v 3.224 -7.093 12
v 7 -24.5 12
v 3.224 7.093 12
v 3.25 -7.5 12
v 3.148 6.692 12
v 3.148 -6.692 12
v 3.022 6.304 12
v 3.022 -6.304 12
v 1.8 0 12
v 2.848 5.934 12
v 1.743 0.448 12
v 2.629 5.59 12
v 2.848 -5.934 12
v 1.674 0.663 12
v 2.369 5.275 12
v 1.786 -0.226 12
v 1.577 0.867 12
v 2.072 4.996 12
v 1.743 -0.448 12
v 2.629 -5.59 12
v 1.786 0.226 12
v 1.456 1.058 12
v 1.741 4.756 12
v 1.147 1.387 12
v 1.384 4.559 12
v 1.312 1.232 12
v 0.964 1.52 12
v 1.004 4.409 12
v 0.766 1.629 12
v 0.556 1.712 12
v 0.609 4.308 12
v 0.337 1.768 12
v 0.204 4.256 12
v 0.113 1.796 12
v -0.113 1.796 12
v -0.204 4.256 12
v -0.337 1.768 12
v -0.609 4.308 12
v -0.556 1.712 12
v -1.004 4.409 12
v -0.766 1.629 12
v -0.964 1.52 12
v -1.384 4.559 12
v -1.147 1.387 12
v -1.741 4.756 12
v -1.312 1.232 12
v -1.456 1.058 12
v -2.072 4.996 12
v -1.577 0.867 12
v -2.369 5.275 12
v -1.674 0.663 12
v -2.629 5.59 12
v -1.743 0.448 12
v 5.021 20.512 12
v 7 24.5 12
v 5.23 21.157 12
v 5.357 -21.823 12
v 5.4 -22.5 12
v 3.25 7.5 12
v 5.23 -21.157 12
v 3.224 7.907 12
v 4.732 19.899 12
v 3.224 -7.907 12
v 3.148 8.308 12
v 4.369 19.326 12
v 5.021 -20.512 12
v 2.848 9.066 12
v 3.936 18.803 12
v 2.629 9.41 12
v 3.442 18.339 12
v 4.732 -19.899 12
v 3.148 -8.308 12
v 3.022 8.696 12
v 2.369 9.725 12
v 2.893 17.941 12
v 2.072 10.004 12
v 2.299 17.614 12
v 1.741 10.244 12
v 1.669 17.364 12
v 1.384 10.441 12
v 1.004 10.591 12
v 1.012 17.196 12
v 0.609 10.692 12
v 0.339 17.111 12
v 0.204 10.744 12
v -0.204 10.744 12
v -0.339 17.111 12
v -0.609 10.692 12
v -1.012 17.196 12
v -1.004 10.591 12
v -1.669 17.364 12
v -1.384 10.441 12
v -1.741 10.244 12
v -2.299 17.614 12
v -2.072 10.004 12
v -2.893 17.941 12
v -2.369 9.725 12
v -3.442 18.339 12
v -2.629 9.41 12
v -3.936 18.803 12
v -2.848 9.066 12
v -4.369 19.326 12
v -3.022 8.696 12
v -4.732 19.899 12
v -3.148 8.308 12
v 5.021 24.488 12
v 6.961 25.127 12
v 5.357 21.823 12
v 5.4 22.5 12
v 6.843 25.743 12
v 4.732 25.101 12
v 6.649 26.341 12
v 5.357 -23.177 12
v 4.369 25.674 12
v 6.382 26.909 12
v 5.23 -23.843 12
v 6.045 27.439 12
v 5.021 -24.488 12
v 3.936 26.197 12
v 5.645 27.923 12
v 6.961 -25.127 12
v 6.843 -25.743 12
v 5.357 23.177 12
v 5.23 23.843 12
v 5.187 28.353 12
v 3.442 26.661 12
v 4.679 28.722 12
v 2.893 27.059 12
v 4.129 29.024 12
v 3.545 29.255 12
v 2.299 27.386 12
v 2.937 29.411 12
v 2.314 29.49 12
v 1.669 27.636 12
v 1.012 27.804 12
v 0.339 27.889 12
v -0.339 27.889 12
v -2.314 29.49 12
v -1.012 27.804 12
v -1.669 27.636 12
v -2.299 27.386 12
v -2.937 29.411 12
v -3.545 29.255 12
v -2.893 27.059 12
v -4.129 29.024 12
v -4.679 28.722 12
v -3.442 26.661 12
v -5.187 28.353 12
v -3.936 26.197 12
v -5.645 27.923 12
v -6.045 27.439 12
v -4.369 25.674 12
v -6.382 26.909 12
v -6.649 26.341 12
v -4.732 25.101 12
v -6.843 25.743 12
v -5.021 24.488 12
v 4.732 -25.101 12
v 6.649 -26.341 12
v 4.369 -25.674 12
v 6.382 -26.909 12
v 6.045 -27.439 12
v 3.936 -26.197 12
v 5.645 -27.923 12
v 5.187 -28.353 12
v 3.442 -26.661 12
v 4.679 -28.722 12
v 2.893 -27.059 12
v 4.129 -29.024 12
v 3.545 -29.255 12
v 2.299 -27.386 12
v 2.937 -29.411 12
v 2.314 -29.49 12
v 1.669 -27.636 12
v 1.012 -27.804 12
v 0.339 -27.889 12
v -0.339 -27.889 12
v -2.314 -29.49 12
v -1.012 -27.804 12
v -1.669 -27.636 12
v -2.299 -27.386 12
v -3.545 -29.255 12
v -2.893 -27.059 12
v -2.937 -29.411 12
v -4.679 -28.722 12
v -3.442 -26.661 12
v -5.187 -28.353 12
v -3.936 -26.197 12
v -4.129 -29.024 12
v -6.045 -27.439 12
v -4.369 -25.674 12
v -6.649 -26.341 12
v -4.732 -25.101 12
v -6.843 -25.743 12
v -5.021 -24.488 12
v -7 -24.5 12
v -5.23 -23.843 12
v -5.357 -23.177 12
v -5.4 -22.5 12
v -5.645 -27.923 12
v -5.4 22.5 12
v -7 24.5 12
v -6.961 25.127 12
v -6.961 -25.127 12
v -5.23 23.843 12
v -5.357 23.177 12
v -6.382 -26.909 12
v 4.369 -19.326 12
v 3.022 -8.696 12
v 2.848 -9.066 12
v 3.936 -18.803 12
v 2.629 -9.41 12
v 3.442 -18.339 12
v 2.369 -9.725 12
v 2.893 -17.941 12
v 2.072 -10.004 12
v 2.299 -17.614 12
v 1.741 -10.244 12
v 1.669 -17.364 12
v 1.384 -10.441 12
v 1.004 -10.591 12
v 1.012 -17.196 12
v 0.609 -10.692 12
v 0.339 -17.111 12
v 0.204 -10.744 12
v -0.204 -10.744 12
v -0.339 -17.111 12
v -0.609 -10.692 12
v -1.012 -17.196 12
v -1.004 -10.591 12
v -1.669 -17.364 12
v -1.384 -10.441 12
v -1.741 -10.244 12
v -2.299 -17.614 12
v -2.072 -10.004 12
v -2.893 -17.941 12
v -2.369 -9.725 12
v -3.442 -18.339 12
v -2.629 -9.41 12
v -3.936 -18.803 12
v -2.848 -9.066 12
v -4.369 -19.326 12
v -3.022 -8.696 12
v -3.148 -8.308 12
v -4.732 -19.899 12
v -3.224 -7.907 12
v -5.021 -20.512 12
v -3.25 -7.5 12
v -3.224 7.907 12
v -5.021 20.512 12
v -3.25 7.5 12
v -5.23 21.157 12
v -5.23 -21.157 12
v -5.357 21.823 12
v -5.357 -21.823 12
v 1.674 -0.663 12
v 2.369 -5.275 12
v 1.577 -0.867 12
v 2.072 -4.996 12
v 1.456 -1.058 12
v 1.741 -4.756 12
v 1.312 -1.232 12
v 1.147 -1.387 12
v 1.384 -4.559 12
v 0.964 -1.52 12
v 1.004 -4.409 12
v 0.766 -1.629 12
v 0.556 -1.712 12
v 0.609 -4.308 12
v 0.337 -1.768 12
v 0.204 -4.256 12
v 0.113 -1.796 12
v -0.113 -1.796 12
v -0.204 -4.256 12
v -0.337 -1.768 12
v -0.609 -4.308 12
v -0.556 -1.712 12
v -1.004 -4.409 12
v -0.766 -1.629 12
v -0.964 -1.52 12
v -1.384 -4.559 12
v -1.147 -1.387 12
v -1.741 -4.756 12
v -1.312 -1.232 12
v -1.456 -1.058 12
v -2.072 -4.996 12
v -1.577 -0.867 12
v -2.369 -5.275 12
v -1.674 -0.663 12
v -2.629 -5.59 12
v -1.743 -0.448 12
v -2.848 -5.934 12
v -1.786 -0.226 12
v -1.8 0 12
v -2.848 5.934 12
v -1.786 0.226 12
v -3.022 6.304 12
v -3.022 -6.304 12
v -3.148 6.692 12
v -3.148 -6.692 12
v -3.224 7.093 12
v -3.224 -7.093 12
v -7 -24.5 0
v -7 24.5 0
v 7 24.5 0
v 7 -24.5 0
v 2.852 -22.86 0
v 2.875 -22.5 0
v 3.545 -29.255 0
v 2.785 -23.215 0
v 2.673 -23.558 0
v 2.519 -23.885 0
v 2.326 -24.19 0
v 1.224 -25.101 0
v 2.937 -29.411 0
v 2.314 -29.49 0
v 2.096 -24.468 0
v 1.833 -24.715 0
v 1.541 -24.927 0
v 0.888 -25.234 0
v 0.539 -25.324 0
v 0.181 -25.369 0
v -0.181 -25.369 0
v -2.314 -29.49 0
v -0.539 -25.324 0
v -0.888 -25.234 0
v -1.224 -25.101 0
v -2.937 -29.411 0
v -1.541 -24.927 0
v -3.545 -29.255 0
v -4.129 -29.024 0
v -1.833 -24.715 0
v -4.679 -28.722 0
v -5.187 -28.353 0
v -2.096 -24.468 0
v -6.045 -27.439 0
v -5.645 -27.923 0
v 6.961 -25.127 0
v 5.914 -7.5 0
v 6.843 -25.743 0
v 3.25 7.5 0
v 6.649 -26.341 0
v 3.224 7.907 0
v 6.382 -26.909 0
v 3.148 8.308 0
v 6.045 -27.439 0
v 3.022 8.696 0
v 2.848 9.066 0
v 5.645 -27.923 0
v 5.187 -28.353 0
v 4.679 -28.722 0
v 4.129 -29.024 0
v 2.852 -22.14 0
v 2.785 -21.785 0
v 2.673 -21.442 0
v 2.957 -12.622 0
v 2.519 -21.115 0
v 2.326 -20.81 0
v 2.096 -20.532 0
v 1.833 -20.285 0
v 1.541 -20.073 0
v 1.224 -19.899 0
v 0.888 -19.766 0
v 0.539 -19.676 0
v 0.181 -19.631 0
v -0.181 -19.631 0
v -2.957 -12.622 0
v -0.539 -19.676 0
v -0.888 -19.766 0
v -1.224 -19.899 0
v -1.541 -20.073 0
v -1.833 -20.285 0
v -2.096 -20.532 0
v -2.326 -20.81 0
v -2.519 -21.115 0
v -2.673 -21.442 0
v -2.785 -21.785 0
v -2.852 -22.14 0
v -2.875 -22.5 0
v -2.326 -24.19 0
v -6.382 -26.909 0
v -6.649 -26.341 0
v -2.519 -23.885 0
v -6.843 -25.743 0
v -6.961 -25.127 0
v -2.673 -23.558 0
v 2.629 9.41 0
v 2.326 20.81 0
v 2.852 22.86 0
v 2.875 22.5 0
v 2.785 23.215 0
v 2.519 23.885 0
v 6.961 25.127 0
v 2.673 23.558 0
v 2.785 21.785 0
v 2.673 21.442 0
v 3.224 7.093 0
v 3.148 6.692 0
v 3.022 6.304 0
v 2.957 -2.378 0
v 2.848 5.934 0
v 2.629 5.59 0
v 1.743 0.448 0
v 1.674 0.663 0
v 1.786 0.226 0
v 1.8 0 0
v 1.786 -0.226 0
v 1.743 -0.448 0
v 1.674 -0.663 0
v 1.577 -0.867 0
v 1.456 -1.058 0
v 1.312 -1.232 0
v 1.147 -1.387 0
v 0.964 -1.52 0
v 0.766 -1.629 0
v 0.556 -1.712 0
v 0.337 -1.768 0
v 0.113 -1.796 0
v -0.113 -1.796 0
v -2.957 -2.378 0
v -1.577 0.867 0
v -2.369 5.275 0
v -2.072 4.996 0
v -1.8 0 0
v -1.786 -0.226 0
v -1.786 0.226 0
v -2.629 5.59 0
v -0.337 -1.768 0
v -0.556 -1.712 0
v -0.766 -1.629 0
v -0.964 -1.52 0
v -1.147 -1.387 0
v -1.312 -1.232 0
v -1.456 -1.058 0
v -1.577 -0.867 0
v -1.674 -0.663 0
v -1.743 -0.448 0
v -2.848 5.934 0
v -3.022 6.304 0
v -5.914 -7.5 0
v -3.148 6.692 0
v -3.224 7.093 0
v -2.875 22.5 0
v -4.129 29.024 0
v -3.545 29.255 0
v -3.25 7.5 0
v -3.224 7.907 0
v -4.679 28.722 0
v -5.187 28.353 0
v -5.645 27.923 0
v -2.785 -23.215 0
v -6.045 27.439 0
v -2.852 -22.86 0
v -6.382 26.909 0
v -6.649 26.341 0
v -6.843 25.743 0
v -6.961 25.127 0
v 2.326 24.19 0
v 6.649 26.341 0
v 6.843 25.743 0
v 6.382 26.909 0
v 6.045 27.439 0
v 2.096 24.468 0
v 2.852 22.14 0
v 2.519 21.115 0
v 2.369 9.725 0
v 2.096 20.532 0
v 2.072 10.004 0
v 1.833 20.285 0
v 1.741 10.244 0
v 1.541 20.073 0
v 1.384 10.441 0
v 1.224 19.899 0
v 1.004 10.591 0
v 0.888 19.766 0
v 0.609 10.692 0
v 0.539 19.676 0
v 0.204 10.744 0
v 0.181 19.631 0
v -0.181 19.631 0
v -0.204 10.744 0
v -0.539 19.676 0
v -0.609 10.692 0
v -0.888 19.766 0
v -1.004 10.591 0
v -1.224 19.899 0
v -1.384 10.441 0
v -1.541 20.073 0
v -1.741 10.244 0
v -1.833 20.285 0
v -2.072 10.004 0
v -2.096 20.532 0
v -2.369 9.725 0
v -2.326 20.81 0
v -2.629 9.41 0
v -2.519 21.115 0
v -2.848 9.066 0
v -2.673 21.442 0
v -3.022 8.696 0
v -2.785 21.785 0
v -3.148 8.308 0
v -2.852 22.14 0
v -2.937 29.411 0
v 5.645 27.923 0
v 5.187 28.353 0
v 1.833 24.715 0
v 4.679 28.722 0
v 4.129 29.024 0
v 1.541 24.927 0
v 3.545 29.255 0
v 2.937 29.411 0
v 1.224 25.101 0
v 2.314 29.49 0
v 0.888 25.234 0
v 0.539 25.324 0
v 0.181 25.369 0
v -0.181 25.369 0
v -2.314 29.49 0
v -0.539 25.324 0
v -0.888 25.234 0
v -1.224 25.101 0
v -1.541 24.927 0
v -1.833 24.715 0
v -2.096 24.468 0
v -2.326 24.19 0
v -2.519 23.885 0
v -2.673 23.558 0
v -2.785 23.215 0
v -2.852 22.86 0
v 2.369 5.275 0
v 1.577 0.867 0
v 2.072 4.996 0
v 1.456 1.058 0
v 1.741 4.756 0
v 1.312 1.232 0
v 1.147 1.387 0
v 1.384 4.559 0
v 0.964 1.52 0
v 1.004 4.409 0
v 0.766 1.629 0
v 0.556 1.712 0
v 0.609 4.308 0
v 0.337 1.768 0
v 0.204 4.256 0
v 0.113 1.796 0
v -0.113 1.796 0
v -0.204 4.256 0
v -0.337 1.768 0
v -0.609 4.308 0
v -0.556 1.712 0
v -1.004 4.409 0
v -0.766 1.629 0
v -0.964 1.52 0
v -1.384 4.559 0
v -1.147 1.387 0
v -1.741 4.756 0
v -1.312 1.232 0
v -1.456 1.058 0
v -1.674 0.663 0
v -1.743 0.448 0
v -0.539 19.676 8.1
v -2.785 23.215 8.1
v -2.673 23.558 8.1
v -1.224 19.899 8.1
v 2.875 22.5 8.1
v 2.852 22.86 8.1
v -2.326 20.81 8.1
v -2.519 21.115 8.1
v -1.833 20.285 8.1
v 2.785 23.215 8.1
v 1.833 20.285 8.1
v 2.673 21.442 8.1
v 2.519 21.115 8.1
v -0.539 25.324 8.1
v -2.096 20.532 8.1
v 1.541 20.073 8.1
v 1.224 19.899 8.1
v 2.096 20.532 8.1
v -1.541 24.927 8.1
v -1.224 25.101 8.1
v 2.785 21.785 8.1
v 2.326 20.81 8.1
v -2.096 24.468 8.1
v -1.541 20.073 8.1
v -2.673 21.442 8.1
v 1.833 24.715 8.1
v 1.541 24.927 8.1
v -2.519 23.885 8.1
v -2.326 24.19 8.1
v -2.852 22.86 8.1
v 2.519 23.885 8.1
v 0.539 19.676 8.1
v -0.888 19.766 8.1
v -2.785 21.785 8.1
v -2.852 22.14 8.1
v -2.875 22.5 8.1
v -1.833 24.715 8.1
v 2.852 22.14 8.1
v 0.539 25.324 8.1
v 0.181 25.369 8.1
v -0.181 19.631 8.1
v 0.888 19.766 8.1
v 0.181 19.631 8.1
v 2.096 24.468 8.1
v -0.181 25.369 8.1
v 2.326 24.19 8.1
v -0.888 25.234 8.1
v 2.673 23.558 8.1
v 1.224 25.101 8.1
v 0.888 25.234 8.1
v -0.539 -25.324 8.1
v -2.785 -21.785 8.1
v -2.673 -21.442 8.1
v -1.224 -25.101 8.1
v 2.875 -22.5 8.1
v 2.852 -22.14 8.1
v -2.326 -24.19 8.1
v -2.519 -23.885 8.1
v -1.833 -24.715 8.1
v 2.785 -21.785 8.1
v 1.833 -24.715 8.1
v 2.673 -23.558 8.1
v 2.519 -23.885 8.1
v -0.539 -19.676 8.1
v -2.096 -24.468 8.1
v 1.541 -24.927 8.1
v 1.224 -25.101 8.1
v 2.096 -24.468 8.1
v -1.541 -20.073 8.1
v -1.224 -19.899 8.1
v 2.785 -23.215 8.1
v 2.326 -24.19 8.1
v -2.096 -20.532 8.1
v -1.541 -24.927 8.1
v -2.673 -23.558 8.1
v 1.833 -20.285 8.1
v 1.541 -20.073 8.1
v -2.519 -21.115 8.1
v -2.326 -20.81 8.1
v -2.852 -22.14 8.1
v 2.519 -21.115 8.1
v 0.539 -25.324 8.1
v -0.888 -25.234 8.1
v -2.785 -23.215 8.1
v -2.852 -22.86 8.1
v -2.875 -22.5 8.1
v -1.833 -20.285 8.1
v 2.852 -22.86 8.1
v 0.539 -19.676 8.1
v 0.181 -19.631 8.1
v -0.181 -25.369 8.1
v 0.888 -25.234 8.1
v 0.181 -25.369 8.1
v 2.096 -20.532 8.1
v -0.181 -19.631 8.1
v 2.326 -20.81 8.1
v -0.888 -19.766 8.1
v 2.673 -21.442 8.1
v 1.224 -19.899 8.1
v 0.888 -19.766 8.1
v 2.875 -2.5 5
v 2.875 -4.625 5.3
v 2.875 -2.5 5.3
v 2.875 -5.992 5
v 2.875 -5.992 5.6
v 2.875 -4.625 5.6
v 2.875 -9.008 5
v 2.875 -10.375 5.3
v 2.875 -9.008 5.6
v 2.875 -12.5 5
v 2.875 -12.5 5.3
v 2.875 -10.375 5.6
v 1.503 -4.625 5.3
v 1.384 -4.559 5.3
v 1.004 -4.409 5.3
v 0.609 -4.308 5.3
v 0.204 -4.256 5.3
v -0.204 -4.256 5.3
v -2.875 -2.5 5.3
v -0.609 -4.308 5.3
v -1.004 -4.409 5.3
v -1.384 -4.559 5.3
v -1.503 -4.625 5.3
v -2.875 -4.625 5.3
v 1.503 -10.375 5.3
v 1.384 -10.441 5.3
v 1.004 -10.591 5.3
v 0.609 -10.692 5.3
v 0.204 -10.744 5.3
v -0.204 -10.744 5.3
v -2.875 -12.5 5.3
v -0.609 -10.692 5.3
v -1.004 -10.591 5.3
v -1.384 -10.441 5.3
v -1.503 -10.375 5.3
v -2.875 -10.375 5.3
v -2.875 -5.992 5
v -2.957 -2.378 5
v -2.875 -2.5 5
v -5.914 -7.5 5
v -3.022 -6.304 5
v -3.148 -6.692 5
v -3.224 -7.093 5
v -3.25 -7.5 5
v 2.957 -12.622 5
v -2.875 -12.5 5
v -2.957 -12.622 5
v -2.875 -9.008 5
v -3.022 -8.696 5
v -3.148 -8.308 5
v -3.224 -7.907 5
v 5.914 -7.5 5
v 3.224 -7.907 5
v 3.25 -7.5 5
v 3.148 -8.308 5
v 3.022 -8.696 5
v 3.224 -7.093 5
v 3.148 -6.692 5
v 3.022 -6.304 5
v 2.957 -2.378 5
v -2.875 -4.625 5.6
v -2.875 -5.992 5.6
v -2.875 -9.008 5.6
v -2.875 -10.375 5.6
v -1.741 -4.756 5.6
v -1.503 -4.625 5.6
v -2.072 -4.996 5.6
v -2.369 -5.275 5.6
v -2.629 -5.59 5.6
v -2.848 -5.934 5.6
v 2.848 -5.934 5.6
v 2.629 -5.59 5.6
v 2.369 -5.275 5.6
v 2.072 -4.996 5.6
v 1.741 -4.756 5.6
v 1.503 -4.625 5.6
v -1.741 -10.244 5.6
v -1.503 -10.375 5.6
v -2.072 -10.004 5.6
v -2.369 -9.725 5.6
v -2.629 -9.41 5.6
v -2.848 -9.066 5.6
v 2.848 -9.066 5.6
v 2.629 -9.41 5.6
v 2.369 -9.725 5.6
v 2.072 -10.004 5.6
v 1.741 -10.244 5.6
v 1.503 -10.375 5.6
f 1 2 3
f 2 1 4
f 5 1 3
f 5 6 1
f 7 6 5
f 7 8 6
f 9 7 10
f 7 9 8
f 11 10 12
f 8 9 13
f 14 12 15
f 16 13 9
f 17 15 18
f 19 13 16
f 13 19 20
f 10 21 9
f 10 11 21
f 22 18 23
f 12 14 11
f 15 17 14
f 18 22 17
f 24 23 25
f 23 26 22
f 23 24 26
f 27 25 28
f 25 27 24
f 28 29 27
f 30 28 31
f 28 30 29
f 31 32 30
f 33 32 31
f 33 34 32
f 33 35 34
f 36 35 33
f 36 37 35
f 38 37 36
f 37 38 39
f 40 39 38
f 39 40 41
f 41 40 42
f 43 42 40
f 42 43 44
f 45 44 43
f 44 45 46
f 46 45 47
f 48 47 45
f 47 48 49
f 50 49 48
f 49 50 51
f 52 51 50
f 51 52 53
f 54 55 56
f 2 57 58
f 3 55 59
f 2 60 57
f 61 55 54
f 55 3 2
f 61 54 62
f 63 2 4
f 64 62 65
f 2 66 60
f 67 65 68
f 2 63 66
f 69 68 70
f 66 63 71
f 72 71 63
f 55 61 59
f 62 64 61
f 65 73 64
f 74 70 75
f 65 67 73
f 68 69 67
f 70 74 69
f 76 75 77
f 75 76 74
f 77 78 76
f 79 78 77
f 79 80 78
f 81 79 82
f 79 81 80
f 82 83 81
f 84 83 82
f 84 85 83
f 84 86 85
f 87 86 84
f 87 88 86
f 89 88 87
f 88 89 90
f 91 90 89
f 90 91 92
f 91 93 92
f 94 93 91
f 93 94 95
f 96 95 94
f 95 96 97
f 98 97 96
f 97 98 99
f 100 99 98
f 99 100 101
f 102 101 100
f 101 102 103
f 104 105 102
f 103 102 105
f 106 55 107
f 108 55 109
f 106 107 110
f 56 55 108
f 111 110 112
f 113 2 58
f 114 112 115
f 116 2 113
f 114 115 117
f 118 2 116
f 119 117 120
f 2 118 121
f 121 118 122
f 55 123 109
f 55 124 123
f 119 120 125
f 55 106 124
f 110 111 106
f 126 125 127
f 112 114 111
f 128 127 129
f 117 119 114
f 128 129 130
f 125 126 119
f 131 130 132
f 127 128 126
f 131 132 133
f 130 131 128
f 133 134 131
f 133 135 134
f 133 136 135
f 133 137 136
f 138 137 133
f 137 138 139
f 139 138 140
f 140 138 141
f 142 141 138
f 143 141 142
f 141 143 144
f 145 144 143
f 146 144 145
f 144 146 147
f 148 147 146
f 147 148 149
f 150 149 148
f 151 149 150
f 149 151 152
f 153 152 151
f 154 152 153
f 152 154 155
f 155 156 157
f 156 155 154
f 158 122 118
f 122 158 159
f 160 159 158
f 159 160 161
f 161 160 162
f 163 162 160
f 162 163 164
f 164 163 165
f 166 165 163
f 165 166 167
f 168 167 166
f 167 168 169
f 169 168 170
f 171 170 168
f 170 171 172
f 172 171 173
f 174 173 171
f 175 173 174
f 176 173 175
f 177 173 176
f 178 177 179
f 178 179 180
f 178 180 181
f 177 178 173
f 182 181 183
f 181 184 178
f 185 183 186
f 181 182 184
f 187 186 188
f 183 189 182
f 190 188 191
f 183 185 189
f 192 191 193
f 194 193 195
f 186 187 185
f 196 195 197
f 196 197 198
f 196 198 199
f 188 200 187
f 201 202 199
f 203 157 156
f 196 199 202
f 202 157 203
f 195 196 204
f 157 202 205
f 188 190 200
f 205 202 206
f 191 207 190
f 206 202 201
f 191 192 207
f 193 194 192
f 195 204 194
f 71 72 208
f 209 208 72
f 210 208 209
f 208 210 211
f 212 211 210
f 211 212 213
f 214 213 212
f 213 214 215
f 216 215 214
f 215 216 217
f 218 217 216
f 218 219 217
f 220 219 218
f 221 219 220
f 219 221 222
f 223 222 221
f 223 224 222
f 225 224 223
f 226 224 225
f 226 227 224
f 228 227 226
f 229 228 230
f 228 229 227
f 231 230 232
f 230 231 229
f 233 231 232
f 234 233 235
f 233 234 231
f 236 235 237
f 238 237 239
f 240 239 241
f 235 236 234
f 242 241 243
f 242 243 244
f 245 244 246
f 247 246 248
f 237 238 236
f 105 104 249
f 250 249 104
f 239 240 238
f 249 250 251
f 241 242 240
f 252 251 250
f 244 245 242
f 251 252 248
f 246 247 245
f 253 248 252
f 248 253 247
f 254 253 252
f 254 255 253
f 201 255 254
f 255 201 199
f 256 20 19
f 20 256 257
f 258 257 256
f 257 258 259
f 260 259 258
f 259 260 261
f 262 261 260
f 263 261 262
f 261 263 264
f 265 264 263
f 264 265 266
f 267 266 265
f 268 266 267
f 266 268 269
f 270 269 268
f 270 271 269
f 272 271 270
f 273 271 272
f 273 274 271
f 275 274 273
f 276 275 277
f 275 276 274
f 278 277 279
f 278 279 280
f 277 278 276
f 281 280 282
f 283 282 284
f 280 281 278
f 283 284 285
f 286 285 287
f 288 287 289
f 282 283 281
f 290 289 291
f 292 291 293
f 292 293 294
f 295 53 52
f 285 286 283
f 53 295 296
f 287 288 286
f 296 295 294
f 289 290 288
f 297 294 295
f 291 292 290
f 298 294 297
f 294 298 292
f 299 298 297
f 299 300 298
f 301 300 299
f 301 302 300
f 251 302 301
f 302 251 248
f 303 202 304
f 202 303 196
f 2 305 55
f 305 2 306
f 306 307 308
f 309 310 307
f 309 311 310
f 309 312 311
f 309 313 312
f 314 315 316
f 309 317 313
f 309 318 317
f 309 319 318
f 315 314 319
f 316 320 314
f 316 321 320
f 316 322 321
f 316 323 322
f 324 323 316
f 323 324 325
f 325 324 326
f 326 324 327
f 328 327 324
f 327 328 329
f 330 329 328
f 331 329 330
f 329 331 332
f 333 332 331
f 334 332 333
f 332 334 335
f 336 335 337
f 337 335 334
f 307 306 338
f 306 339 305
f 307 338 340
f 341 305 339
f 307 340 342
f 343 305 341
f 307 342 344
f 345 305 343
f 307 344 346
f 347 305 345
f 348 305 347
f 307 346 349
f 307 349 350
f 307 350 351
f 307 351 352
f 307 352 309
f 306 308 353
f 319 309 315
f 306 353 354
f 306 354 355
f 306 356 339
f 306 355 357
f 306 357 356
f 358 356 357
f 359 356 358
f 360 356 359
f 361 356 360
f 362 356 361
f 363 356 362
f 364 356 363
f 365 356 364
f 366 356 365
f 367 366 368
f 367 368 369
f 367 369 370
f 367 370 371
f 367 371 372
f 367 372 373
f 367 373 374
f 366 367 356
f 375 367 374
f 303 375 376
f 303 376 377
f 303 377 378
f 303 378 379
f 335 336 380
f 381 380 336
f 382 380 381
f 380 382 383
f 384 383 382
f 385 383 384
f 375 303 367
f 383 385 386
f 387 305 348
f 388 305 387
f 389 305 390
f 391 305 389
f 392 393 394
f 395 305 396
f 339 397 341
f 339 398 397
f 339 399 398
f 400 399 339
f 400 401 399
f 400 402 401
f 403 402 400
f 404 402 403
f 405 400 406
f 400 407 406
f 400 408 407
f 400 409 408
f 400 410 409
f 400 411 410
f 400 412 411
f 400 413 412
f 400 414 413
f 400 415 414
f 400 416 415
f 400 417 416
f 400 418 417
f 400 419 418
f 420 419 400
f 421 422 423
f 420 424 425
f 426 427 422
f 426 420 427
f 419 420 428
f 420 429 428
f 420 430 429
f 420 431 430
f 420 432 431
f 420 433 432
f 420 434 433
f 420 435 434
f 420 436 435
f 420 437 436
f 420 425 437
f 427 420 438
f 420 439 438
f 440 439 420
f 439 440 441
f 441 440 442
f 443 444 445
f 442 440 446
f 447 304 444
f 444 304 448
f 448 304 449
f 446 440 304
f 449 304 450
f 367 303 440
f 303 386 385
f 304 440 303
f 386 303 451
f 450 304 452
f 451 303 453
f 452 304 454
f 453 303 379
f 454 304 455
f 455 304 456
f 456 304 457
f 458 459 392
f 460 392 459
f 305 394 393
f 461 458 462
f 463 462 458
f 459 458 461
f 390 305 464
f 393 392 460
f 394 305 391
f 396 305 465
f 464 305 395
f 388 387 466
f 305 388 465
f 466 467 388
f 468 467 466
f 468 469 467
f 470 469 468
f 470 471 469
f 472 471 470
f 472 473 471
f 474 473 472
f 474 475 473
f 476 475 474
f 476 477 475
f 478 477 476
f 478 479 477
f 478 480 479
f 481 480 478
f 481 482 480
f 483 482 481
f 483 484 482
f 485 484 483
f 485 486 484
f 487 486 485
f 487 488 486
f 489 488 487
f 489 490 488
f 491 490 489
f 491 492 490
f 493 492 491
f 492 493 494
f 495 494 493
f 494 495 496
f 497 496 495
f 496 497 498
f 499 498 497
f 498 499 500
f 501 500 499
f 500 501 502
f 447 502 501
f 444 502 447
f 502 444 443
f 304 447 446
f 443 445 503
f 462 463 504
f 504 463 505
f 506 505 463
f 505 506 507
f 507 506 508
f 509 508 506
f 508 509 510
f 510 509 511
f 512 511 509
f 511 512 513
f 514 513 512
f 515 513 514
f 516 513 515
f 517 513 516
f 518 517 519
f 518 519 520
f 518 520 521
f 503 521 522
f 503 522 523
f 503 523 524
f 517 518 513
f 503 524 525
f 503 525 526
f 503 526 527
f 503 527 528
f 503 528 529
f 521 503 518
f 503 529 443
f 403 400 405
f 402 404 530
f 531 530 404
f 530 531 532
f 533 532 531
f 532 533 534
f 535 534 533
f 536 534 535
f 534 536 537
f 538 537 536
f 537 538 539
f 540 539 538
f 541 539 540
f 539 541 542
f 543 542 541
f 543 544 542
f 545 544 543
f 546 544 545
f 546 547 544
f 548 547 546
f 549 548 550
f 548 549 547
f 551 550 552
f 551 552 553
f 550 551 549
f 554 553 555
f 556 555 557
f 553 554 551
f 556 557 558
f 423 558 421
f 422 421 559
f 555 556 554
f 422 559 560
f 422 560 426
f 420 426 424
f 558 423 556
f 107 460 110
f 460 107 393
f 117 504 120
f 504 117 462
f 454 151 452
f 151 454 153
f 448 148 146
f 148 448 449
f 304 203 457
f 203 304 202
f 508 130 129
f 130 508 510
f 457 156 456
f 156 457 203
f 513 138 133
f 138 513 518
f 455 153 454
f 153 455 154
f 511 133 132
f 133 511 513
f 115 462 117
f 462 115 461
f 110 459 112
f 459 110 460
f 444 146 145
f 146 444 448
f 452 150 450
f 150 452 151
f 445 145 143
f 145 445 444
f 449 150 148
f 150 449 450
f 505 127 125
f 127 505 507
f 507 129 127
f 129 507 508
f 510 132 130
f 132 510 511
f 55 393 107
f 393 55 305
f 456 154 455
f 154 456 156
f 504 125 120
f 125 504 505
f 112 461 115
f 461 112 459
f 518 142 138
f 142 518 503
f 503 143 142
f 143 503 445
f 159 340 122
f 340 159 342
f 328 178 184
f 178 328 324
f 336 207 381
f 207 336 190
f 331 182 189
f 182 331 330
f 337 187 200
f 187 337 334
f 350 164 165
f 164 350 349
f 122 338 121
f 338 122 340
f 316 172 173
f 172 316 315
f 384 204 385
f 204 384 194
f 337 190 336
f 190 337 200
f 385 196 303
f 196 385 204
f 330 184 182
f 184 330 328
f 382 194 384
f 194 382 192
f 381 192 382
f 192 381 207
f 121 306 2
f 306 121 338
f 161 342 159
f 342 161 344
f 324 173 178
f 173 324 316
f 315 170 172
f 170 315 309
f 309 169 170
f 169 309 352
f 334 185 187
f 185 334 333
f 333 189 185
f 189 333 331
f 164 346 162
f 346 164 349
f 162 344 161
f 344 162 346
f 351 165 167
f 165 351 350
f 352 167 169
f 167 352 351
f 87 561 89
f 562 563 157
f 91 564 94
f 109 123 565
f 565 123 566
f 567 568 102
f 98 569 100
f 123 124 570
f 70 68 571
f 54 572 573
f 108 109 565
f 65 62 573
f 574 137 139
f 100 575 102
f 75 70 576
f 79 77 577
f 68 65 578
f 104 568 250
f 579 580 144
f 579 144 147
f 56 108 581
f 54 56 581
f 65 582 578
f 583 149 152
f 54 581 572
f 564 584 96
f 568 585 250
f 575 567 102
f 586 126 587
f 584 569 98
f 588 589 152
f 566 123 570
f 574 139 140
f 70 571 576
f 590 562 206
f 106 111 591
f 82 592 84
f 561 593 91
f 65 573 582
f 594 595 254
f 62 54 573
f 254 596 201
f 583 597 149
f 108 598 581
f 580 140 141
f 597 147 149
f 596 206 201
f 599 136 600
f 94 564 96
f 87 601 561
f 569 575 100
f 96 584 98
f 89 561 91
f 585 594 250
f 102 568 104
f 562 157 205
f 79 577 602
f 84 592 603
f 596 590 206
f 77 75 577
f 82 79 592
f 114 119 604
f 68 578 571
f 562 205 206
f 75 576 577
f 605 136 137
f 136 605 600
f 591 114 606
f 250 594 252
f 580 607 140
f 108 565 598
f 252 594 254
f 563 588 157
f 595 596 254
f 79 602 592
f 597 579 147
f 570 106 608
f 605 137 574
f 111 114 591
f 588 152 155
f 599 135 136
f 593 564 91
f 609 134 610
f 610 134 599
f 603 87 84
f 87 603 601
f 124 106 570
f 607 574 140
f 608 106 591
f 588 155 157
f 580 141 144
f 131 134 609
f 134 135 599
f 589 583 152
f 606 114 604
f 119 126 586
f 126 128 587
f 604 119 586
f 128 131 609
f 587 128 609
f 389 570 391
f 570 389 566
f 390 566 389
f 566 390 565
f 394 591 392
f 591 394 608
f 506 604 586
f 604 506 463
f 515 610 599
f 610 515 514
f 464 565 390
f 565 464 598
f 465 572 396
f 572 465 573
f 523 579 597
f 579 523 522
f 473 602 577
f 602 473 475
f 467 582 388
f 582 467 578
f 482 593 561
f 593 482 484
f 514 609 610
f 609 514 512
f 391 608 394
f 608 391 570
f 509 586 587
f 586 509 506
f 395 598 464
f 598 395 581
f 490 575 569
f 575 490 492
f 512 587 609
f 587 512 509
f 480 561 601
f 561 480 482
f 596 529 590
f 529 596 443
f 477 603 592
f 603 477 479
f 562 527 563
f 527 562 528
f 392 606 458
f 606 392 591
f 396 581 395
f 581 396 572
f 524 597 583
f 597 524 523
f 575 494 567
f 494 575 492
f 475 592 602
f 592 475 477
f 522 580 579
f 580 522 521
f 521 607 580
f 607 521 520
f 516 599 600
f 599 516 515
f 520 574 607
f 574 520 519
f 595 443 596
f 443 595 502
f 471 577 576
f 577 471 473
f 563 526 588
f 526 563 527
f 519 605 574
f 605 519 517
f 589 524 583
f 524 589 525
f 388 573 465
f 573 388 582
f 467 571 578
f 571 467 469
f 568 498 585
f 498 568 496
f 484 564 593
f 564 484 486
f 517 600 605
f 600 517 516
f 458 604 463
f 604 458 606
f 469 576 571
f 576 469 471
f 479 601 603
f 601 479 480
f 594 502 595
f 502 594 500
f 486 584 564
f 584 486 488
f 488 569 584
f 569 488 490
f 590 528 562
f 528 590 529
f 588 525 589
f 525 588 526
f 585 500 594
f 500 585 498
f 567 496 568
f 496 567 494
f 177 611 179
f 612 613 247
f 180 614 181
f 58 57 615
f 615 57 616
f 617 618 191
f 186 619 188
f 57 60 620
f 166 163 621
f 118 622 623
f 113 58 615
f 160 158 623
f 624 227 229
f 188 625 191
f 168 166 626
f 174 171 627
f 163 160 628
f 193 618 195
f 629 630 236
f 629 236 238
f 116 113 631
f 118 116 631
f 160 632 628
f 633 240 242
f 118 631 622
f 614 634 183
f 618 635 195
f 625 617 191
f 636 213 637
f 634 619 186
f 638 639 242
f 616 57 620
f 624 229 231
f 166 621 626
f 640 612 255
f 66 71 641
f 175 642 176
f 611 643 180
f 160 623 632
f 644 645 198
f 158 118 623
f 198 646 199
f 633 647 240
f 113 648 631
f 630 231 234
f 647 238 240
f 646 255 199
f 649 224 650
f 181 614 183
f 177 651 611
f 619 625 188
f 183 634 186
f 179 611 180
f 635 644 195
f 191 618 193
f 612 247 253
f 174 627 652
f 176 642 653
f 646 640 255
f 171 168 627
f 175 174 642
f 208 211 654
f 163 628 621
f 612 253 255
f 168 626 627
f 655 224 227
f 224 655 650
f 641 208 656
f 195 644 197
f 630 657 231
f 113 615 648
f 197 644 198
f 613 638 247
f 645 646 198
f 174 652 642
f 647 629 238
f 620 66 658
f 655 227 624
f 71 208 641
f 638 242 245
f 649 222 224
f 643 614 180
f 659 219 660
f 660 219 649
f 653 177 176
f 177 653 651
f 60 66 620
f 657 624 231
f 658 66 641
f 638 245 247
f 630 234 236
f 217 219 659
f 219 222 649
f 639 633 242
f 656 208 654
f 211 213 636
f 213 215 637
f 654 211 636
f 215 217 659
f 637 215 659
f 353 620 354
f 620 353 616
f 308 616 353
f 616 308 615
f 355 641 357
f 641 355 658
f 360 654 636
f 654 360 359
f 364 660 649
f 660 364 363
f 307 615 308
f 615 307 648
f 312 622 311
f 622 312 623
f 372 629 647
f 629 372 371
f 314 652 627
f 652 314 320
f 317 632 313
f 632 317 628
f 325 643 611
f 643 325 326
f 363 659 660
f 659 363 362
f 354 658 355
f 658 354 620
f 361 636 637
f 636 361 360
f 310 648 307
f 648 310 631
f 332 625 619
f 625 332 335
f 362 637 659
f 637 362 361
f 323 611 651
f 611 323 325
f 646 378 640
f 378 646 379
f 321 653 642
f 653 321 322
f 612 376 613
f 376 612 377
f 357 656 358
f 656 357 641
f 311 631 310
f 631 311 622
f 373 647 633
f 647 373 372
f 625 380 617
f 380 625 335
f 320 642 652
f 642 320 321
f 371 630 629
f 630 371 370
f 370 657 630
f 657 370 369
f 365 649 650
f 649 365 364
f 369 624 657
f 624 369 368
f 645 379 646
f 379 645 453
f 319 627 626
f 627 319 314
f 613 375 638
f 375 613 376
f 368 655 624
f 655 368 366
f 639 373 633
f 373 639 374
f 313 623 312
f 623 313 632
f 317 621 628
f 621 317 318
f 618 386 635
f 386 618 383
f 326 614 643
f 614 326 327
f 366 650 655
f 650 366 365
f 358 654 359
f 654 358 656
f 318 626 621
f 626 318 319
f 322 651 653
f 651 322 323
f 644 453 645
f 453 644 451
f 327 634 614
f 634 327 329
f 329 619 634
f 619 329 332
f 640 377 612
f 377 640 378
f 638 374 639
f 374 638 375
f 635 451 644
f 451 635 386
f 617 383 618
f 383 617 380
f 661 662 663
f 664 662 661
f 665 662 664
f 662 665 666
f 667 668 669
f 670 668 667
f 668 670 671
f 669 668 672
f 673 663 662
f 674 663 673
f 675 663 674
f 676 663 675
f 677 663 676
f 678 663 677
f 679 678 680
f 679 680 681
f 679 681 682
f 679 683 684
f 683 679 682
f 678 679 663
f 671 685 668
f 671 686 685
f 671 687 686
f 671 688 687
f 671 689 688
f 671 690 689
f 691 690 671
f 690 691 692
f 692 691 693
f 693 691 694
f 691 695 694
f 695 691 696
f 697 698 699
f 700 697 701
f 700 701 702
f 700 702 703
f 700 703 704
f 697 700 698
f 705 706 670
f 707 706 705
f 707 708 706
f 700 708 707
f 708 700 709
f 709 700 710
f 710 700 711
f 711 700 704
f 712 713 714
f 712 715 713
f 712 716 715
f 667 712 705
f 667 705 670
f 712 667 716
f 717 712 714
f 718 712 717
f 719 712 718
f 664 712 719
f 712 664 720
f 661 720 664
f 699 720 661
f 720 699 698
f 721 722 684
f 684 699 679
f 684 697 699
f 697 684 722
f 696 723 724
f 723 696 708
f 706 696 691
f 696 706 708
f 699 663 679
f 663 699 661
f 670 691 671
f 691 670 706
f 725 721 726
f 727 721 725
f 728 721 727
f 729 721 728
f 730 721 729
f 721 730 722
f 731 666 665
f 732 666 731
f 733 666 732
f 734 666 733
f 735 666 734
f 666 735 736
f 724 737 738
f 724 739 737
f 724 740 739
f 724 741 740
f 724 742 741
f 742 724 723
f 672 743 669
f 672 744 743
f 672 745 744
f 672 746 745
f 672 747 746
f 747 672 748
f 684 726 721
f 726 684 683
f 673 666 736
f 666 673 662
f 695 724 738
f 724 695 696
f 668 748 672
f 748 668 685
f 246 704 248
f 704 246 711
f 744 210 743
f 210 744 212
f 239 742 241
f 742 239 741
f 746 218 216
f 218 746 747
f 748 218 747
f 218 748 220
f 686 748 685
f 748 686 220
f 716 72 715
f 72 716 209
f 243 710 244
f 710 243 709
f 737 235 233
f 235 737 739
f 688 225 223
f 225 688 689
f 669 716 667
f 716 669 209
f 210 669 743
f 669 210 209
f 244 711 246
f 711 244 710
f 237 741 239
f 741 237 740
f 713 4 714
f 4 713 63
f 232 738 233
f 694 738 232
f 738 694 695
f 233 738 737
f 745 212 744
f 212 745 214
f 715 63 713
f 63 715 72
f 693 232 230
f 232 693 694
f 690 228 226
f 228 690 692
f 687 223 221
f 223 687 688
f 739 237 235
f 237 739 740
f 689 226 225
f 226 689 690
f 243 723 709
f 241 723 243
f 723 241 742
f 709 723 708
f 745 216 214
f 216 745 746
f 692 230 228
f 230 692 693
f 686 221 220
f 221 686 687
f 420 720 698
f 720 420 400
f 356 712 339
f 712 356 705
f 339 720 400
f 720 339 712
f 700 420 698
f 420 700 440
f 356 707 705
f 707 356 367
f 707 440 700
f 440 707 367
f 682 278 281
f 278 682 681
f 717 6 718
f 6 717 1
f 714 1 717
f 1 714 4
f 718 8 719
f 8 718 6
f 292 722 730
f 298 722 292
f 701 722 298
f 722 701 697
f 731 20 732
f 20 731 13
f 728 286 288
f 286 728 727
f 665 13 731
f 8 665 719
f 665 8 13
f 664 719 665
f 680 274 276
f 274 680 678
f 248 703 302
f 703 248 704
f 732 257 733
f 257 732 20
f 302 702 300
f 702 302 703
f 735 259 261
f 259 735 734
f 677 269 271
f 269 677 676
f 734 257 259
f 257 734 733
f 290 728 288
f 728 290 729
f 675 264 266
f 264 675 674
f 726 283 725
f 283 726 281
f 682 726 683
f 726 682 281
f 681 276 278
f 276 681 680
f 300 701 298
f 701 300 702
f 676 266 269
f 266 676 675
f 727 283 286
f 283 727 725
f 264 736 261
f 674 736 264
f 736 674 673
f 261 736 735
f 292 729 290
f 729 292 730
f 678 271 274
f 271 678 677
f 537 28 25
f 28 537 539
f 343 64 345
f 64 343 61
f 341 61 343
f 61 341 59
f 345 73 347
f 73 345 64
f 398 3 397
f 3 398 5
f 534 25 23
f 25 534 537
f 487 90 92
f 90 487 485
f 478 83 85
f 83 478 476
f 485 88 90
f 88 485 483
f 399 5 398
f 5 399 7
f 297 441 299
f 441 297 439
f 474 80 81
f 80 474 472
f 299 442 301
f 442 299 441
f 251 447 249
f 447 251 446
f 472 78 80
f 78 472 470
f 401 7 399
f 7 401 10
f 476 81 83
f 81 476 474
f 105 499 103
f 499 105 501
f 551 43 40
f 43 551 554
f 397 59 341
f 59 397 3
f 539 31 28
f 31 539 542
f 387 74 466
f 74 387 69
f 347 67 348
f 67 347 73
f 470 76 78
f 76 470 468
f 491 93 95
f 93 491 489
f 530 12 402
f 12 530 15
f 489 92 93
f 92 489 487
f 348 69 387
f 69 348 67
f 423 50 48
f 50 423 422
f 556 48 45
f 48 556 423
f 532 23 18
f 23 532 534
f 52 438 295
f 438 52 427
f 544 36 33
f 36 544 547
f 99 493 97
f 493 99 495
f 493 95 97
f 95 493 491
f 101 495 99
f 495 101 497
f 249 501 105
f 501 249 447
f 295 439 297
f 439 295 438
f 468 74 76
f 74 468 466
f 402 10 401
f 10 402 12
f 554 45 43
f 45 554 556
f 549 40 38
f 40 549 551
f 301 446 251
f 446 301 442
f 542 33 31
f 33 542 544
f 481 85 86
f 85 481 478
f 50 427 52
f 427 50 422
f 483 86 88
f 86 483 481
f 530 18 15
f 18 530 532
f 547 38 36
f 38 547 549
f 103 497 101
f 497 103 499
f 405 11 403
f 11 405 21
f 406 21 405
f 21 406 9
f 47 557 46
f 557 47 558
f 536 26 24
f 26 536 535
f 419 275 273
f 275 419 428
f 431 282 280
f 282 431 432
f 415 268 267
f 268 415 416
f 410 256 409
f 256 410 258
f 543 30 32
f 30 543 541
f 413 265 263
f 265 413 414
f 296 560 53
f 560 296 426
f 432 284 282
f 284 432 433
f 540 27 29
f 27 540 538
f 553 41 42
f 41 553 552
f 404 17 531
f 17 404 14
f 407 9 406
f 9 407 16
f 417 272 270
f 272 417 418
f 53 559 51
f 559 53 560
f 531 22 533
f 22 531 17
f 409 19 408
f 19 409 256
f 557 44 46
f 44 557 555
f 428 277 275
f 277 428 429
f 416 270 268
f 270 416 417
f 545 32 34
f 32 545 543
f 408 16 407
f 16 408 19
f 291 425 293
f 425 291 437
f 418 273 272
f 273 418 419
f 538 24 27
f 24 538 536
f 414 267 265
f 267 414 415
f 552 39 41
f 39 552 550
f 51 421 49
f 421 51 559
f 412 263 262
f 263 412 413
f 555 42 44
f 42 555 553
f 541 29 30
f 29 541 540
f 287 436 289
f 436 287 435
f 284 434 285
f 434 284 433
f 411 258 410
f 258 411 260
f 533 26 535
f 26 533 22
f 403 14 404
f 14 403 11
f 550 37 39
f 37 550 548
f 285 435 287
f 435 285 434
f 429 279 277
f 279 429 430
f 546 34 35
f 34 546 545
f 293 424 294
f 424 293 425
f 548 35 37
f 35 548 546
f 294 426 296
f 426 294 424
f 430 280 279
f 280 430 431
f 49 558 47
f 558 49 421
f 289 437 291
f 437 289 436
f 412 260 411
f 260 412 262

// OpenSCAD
$fn = 50;


difference() {
	union() {
		hull() {
			translate(v = [-2.0000000000, 9.5000000000, 0]) {
				cylinder(h = 12, r = 5);
			}
			translate(v = [2.0000000000, 9.5000000000, 0]) {
				cylinder(h = 12, r = 5);
			}
			translate(v = [-2.0000000000, -9.5000000000, 0]) {
				cylinder(h = 12, r = 5);
			}
			translate(v = [2.0000000000, -9.5000000000, 0]) {
				cylinder(h = 12, r = 5);
			}
		}
		translate(v = [0.0000000000, 15.0000000000, 0]) {
			hull() {
				translate(v = [-2.0000000000, 9.5000000000, 0]) {
					cylinder(h = 12, r = 5);
				}
				translate(v = [2.0000000000, 9.5000000000, 0]) {
					cylinder(h = 12, r = 5);
				}
				translate(v = [-2.0000000000, -9.5000000000, 0]) {
					cylinder(h = 12, r = 5);
				}
				translate(v = [2.0000000000, -9.5000000000, 0]) {
					cylinder(h = 12, r = 5);
				}
			}
		}
		translate(v = [0.0000000000, 15.0000000000, 0]) {
			hull() {
				translate(v = [-2.0000000000, 9.5000000000, 0]) {
					cylinder(h = 12, r = 5);
				}
				translate(v = [2.0000000000, 9.5000000000, 0]) {
					cylinder(h = 12, r = 5);
				}
				translate(v = [-2.0000000000, -9.5000000000, 0]) {
					cylinder(h = 12, r = 5);
				}
				translate(v = [2.0000000000, -9.5000000000, 0]) {
					cylinder(h = 12, r = 5);
				}
			}
		}
		translate(v = [0.0000000000, -15.0000000000, 0]) {
			hull() {
				translate(v = [-2.0000000000, 9.5000000000, 0]) {
					cylinder(h = 12, r = 5);
				}
				translate(v = [2.0000000000, 9.5000000000, 0]) {
					cylinder(h = 12, r = 5);
				}
				translate(v = [-2.0000000000, -9.5000000000, 0]) {
					cylinder(h = 12, r = 5);
				}
				translate(v = [2.0000000000, -9.5000000000, 0]) {
					cylinder(h = 12, r = 5);
				}
			}
		}
		translate(v = [0.0000000000, -15.0000000000, 0]) {
			hull() {
				translate(v = [-2.0000000000, 9.5000000000, 0]) {
					cylinder(h = 12, r = 5);
				}
				translate(v = [2.0000000000, 9.5000000000, 0]) {
					cylinder(h = 12, r = 5);
				}
				translate(v = [-2.0000000000, -9.5000000000, 0]) {
					cylinder(h = 12, r = 5);
				}
				translate(v = [2.0000000000, -9.5000000000, 0]) {
					cylinder(h = 12, r = 5);
				}
			}
		}
	}
	union() {
		translate(v = [0.0000000000, 22.5000000000, 12]) {
			rotate(a = [0, 0, 0]) {
				difference() {
					union() {
						#translate(v = [0, 0, -12.0000000000]) {
							cylinder(h = 12, r = 2.6000000000);
						}
						#translate(v = [0, 0, -3.9000000000]) {
							cylinder(h = 3.9000000000, r1 = 2.8750000000, r2 = 5.4000000000);
						}
						#translate(v = [0, 0, -12.0000000000]) {
							cylinder(h = 12, r = 2.8750000000);
						}
						#translate(v = [0, 0, -12.0000000000]) {
							cylinder(h = 12, r = 2.6000000000);
						}
					}
					union();
				}
			}
		}
		translate(v = [0.0000000000, 22.5000000000, 12]) {
			rotate(a = [0, 0, 0]) {
				difference() {
					union() {
						#translate(v = [0, 0, -12.0000000000]) {
							cylinder(h = 12, r = 2.6000000000);
						}
						#translate(v = [0, 0, -3.9000000000]) {
							cylinder(h = 3.9000000000, r1 = 2.8750000000, r2 = 5.4000000000);
						}
						#translate(v = [0, 0, -12.0000000000]) {
							cylinder(h = 12, r = 2.8750000000);
						}
						#translate(v = [0, 0, -12.0000000000]) {
							cylinder(h = 12, r = 2.6000000000);
						}
					}
					union();
				}
			}
		}
		translate(v = [0.0000000000, -22.5000000000, 12]) {
			rotate(a = [0, 0, 0]) {
				difference() {
					union() {
						#translate(v = [0, 0, -12.0000000000]) {
							cylinder(h = 12, r = 2.6000000000);
						}
						#translate(v = [0, 0, -3.9000000000]) {
							cylinder(h = 3.9000000000, r1 = 2.8750000000, r2 = 5.4000000000);
						}
						#translate(v = [0, 0, -12.0000000000]) {
							cylinder(h = 12, r = 2.8750000000);
						}
						#translate(v = [0, 0, -12.0000000000]) {
							cylinder(h = 12, r = 2.6000000000);
						}
					}
					union();
				}
			}
		}
		translate(v = [0.0000000000, -22.5000000000, 12]) {
			rotate(a = [0, 0, 0]) {
				difference() {
					union() {
						#translate(v = [0, 0, -12.0000000000]) {
							cylinder(h = 12, r = 2.6000000000);
						}
						#translate(v = [0, 0, -3.9000000000]) {
							cylinder(h = 3.9000000000, r1 = 2.8750000000, r2 = 5.4000000000);
						}
						#translate(v = [0, 0, -12.0000000000]) {
							cylinder(h = 12, r = 2.8750000000);
						}
						#translate(v = [0, 0, -12.0000000000]) {
							cylinder(h = 12, r = 2.6000000000);
						}
					}
					union();
				}
			}
		}
		translate(v = [0.0000000000, -7.5000000000, 0]) {
			rotate(a = [0, 0, 0]) {
				difference() {
					union() {
						#translate(v = [-2.8750000000, -5.0000000000, -0.3000000000]) {
							cube(size = [5.7500000000, 10, 0.3000000000]);
						}
						#translate(v = [-2.8750000000, -2.8750000000, -0.6000000000]) {
							cube(size = [5.7500000000, 5.7500000000, 0.3000000000]);
						}
						#translate(v = [-2.8750000000, -5.0000000000, 5]) {
							cube(size = [5.7500000000, 10, 0.3000000000]);
						}
						#translate(v = [-2.8750000000, -2.8750000000, 5.3000000000]) {
							cube(size = [5.7500000000, 5.7500000000, 0.3000000000]);
						}
						#translate(v = [0, 0, -100.0000000000]) {
							cylinder(h = 200, r = 3.2500000000);
						}
						#linear_extrude(height = 5) {
							polygon(points = [[5.9142500000, 0.0000000000], [2.9571250000, 5.1218907443], [-2.9571250000, 5.1218907443], [-5.9142500000, 0.0000000000], [-2.9571250000, -5.1218907443], [2.9571250000, -5.1218907443]]);
						}
						#translate(v = [-2.8750000000, -5.0000000000, -0.3000000000]) {
							cube(size = [5.7500000000, 10, 0.3000000000]);
						}
						#translate(v = [-2.8750000000, -2.8750000000, -0.6000000000]) {
							cube(size = [5.7500000000, 5.7500000000, 0.3000000000]);
						}
						#translate(v = [-2.8750000000, -5.0000000000, 5]) {
							cube(size = [5.7500000000, 10, 0.3000000000]);
						}
						#translate(v = [-2.8750000000, -2.8750000000, 5.3000000000]) {
							cube(size = [5.7500000000, 5.7500000000, 0.3000000000]);
						}
						#translate(v = [0, 0, -100.0000000000]) {
							cylinder(h = 200, r = 3.2500000000);
						}
						#translate(v = [-2.8750000000, -5.0000000000, -0.3000000000]) {
							cube(size = [5.7500000000, 10, 0.3000000000]);
						}
						#translate(v = [-2.8750000000, -2.8750000000, -0.6000000000]) {
							cube(size = [5.7500000000, 5.7500000000, 0.3000000000]);
						}
						#translate(v = [-2.8750000000, -5.0000000000, 5]) {
							cube(size = [5.7500000000, 10, 0.3000000000]);
						}
						#translate(v = [-2.8750000000, -2.8750000000, 5.3000000000]) {
							cube(size = [5.7500000000, 5.7500000000, 0.3000000000]);
						}
						#translate(v = [0, 0, -100.0000000000]) {
							cylinder(h = 200, r = 3.2500000000);
						}
					}
					union();
				}
			}
		}
		translate(v = [0.0000000000, -7.5000000000, 0]) {
			translate(v = [0, 0, -100]) {
				cylinder(h = 200, r = 3.2500000000);
			}
		}
		translate(v = [0.0000000000, 7.5000000000, 0]) {
			translate(v = [0, 0, -100]) {
				cylinder(h = 200, r = 3.2500000000);
			}
		}
		translate(v = [0.0000000000, -7.5000000000, 0]) {
			translate(v = [0, 0, -100]) {
				cylinder(h = 200, r = 1.8000000000);
			}
		}
		translate(v = [0, 0, -100]) {
			cylinder(h = 200, r = 1.8000000000);
		}
		translate(v = [0.0000000000, 7.5000000000, 0]) {
			translate(v = [0, 0, -100]) {
				cylinder(h = 200, r = 1.8000000000);
			}
		}
	}
}
